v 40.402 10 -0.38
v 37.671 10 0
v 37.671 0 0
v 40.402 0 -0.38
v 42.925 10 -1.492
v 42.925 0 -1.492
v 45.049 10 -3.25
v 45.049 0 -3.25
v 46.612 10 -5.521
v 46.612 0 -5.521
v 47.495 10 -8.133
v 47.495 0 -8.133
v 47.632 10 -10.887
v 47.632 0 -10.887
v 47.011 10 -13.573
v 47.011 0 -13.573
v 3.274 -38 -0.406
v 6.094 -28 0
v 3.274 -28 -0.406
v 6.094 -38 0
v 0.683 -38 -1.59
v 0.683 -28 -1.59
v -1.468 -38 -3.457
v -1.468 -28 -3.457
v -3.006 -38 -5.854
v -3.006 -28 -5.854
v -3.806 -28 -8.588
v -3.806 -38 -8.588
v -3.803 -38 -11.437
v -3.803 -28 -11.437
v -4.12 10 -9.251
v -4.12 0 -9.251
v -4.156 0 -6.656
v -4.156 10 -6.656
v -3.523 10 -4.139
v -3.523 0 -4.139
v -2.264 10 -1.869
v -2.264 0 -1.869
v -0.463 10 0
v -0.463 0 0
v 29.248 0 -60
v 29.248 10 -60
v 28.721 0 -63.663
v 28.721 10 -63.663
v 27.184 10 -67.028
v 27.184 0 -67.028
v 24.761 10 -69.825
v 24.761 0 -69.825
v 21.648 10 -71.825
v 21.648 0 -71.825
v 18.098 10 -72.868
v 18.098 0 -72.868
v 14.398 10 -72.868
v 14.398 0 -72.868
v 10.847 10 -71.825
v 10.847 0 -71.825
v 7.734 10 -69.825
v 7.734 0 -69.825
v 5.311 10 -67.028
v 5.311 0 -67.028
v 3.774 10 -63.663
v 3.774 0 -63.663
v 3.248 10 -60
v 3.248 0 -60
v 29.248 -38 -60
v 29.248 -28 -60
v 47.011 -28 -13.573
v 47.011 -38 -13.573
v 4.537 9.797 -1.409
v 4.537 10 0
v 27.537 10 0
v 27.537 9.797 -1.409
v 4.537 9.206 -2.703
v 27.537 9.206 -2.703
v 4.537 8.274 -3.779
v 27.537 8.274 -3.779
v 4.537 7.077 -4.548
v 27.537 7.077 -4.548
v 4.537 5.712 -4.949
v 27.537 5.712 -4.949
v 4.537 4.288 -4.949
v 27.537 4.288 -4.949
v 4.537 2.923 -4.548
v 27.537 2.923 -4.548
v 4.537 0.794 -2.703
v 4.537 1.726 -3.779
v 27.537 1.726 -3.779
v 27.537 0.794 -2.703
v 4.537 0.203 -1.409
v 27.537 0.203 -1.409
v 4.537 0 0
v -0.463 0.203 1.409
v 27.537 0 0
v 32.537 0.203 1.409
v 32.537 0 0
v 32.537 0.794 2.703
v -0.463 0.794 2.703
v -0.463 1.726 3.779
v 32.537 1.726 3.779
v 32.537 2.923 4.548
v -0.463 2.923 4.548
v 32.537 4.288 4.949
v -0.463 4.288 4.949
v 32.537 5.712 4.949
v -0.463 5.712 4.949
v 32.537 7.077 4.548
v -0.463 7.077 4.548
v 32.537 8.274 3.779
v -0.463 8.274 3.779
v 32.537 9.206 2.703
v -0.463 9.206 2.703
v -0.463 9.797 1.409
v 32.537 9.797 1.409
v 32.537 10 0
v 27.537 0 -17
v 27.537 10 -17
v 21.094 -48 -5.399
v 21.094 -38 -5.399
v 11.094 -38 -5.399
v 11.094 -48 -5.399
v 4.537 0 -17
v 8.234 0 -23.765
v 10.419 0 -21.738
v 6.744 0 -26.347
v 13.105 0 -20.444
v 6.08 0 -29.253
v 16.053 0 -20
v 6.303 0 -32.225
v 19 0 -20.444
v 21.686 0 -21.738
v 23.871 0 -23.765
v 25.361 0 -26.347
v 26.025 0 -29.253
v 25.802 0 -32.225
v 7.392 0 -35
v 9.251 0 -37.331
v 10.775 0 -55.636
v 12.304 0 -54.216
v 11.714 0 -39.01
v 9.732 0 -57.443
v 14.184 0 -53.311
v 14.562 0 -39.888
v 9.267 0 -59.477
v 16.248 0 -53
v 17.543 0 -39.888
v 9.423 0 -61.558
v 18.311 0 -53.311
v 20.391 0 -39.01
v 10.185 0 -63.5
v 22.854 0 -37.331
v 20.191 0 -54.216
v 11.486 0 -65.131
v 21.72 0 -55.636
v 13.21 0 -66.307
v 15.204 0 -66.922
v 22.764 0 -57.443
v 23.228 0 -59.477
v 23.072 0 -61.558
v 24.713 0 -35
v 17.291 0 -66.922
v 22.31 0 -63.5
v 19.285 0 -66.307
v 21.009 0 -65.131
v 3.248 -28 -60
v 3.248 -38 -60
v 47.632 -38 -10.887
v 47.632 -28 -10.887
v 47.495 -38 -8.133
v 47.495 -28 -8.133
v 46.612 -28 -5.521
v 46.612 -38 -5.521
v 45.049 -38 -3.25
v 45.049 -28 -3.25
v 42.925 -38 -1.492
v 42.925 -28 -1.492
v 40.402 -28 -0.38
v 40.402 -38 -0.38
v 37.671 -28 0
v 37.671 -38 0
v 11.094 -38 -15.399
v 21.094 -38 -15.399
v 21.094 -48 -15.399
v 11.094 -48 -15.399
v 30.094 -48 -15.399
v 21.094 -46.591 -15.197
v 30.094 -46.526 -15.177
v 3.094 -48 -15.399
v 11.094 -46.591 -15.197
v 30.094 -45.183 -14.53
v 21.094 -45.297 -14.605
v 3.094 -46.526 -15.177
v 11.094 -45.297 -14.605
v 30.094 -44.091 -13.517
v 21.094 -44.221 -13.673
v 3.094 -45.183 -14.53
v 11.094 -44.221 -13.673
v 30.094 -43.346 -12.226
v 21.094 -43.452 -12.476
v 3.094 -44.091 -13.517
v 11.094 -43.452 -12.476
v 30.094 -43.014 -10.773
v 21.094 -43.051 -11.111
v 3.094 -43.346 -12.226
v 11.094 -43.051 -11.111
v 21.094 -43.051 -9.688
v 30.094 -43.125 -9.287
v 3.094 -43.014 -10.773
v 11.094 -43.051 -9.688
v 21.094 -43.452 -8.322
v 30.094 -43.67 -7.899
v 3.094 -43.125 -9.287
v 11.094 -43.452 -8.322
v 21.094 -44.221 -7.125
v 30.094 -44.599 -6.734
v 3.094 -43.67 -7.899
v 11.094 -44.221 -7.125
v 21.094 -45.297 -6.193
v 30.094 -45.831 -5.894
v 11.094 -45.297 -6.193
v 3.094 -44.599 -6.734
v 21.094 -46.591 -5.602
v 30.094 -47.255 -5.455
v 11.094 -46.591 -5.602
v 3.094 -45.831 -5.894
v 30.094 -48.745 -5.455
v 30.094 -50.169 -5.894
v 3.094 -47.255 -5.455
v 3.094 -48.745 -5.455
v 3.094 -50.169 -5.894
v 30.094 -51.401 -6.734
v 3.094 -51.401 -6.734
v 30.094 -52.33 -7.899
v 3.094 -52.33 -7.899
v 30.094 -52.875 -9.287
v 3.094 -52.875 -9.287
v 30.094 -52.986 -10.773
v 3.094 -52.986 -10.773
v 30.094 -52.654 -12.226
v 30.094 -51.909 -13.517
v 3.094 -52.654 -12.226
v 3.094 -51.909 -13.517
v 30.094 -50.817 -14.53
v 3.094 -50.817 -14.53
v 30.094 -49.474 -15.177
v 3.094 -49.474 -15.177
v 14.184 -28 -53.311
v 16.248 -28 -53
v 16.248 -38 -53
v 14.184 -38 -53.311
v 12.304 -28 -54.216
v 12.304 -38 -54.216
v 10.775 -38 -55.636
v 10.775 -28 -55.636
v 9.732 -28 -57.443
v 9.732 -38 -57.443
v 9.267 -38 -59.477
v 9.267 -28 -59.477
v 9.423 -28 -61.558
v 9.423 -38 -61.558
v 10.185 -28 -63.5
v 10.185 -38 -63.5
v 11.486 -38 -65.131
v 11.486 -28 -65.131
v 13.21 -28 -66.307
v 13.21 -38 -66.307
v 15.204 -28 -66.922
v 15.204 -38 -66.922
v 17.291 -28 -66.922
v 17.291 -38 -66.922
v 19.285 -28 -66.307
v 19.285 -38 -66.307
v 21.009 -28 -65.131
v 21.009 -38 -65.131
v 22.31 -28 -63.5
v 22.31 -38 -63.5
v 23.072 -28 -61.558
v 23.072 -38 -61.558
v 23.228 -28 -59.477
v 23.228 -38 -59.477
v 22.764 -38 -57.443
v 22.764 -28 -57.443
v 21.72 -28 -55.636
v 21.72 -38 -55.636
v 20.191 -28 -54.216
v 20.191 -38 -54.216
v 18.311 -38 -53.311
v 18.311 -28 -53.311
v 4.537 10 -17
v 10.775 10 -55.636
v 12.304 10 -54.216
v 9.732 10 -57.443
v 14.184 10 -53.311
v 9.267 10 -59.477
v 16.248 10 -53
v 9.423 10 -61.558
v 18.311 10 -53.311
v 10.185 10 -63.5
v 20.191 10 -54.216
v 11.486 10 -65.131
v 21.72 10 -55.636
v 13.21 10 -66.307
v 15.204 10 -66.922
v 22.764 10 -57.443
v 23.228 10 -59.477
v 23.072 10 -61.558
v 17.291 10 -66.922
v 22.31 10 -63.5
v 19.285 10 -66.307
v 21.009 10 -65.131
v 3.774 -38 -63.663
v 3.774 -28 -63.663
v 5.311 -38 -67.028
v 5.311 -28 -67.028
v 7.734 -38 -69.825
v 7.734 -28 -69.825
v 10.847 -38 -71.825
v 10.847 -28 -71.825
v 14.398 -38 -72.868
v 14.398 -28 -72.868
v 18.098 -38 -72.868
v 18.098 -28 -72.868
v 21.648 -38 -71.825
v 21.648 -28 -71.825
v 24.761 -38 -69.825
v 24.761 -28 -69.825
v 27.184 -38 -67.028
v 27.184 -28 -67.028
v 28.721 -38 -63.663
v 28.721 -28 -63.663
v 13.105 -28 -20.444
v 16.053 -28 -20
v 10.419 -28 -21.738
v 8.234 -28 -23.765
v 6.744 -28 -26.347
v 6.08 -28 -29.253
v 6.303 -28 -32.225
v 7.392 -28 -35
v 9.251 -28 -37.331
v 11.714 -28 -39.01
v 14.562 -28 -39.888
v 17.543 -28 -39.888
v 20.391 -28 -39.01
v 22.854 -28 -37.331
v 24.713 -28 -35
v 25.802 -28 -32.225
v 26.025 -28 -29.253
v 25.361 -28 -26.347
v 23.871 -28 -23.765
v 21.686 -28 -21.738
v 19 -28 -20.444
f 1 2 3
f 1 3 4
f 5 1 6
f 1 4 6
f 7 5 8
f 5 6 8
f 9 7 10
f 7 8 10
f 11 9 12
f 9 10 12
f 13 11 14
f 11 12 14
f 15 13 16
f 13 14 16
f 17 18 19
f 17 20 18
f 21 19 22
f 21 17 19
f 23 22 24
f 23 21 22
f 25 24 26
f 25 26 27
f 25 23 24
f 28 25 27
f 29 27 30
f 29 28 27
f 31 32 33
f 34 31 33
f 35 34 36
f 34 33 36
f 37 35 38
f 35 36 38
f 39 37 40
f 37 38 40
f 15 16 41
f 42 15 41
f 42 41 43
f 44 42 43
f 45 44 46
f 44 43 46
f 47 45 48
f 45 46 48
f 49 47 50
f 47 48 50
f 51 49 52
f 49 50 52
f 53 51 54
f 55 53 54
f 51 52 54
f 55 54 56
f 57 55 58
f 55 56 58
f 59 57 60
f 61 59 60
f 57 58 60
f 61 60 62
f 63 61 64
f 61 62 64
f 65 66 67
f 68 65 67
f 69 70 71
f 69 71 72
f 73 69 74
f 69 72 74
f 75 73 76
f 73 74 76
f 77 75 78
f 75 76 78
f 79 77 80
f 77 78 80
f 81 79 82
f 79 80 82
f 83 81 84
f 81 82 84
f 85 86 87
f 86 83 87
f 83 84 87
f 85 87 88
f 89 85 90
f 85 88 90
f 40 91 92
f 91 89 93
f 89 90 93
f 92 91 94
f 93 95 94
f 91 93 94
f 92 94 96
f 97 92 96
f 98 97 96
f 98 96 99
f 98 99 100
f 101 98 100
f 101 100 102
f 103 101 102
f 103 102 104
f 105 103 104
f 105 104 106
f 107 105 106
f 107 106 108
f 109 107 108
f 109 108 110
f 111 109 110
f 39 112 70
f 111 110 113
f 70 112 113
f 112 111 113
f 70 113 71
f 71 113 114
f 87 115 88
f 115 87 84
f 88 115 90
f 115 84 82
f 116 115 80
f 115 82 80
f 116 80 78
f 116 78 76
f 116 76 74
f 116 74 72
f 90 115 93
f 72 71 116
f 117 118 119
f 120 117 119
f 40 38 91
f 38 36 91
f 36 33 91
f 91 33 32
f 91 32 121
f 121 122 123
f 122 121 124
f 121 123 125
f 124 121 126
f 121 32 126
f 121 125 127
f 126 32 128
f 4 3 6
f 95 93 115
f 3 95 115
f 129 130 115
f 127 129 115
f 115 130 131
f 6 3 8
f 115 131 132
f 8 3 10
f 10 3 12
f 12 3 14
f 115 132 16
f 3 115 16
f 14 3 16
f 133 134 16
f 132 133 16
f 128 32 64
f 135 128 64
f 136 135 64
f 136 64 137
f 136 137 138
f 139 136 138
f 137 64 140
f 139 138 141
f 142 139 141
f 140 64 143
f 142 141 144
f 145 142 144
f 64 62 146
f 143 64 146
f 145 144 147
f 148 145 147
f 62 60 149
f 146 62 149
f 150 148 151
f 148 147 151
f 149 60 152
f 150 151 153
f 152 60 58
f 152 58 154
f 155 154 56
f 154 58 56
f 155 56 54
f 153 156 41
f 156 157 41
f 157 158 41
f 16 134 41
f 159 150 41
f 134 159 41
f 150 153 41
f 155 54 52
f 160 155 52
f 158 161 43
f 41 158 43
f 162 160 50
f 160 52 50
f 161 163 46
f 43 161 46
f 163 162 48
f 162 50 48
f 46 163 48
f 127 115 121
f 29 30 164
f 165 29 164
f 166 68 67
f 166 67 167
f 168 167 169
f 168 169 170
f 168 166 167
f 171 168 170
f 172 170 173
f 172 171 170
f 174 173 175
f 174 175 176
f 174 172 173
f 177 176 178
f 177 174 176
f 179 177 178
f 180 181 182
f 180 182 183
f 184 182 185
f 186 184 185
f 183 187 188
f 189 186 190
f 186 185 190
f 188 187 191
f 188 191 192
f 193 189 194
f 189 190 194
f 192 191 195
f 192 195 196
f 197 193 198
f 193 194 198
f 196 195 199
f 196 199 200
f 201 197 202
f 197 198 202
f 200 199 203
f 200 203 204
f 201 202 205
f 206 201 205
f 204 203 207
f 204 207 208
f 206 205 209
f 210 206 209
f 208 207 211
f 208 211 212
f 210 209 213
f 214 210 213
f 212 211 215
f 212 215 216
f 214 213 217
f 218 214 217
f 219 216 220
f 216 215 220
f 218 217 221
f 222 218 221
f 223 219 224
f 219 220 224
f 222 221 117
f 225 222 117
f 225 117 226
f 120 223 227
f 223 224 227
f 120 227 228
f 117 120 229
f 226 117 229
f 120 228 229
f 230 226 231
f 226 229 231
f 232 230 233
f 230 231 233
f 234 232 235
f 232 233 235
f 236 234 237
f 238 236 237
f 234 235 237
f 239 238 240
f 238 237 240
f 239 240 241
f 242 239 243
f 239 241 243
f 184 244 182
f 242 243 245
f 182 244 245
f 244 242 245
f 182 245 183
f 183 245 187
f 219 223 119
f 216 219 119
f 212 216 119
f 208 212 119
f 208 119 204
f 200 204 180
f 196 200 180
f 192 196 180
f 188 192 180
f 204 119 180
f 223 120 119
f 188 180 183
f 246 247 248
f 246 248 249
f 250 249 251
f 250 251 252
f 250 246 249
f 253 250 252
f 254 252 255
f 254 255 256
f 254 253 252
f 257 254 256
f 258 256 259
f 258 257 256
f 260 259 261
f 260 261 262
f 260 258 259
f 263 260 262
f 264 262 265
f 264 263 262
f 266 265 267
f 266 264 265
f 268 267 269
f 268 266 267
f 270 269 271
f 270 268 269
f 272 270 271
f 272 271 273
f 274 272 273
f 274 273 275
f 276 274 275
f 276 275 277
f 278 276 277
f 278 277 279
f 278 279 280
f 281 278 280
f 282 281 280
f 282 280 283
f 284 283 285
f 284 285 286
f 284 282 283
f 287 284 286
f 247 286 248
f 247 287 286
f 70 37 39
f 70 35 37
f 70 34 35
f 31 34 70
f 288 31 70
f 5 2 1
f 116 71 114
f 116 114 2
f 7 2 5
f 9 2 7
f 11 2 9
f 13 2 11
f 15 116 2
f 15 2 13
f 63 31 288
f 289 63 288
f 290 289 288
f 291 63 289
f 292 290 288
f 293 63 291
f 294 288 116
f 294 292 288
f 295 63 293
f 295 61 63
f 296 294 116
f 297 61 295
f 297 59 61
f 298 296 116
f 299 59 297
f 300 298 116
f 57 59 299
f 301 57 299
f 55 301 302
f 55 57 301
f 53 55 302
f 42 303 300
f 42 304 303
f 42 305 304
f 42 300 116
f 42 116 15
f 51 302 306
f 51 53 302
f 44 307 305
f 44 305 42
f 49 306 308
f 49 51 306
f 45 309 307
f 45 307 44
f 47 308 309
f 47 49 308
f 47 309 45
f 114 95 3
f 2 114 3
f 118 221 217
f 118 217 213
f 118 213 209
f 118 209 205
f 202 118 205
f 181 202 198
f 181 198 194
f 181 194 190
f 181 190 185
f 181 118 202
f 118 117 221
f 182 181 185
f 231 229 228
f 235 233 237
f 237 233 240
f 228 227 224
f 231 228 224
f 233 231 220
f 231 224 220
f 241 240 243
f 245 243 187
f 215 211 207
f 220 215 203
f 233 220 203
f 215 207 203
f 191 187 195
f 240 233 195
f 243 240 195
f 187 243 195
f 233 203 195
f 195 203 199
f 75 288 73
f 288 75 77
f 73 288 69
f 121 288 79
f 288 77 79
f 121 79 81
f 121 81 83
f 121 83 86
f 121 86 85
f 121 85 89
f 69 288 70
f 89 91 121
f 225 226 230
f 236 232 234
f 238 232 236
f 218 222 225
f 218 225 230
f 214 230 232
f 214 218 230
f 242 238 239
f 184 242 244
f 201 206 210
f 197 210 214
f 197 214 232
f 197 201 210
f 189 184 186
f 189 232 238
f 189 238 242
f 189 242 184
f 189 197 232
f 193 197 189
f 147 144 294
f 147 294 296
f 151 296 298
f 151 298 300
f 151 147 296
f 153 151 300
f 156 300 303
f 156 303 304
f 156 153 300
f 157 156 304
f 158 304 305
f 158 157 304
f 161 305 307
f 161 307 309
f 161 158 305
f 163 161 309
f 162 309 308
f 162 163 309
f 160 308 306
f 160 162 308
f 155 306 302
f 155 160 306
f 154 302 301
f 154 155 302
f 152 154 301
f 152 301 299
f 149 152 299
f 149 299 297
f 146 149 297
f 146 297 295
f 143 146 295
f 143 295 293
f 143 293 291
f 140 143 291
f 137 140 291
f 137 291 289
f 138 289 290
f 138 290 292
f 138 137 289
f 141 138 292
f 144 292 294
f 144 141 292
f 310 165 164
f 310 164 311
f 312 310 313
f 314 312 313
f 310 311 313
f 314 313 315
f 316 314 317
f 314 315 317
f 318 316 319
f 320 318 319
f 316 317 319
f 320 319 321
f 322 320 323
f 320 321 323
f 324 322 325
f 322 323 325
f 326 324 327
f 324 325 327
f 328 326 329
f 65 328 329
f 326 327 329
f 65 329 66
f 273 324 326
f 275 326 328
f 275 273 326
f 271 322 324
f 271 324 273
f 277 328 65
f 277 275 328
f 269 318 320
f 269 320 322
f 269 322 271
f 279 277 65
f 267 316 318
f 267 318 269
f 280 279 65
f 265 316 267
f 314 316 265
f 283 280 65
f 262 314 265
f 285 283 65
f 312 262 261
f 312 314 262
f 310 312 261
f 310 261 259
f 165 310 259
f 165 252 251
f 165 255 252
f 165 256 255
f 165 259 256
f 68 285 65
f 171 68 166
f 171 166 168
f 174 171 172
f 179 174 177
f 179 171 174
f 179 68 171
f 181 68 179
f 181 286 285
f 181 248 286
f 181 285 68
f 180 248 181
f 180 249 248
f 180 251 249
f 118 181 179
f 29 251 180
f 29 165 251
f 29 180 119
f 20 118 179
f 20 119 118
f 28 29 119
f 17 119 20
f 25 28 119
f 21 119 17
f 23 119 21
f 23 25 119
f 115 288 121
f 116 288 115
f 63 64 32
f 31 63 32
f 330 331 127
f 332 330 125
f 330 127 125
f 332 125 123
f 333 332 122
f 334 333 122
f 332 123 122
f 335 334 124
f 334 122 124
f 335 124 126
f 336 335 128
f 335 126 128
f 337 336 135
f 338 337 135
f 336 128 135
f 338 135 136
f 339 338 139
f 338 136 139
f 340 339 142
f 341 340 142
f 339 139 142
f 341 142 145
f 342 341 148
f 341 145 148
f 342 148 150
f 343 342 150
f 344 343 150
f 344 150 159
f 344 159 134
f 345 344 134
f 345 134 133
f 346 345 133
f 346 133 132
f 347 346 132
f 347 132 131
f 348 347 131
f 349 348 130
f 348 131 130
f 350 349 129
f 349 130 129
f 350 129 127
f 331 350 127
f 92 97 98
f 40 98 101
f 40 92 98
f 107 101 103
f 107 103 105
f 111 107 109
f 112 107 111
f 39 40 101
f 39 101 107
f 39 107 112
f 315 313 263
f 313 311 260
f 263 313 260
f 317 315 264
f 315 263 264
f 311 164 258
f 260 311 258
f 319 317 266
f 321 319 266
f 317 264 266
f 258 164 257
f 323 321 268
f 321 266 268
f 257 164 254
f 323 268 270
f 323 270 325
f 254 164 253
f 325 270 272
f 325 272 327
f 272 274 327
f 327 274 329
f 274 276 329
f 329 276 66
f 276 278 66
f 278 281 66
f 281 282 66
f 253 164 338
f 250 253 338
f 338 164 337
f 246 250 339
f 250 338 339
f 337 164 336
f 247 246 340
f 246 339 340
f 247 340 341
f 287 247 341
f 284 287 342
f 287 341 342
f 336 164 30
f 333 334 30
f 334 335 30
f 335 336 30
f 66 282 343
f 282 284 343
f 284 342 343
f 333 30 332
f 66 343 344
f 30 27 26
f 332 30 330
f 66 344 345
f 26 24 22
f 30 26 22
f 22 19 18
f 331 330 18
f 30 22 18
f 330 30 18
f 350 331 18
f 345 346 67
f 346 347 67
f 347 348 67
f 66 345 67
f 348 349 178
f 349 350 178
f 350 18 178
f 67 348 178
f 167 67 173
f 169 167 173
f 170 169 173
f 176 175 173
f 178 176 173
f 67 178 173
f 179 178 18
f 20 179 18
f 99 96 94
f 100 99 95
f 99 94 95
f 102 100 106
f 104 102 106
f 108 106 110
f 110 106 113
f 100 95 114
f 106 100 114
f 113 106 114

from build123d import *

# Parameters (mm, degrees)
SKETCH1_R                = 13
SKETCH1_R_2              = 7
BOSS_EXTRUDE2_DEPTH      = 10
SKETCH2_R                = 10
BOSS_EXTRUDE3_DEPTH      = 28
SKETCH3_R                = 10
SKETCH3_R_2              = 13
SKETCH3_R_3              = 7
BOSS_EXTRUDE4_DEPTH      = 10
SKETCH4_R                = 10
BOSS_EXTRUDE5_DEPTH      = 10
FILLET1_R                = 10
CUT_EXTRUDE1_DEPTH       = 17
BOSS_EXTRUDE6_DEPTH      = 28
BOSS_EXTRUDE6_DEPTH_BACK = 5
SKETCH6_R                = 5
FILLET2_R                = 10
SKETCH7_W                = 10
SKETCH7_H                = 10
BOSS_EXTRUDE7_DEPTH      = 10
BOSS_EXTRUDE8_DEPTH      = 9
BOSS_EXTRUDE8_DEPTH_BACK = 18
SKETCH8_R                = 5


with BuildPart() as part:
    # Sketch1 → Boss-Extrude2 (new body)
    # profile 1 of 2: a face of its own
    with BuildSketch(Plane(origin=(0, 0, 0), x_dir=(1, 0, 0), z_dir=(0, 1, 0))):
        with BuildLine():
            ThreePointArc((29.247640438, 60), (16.247640438, 47), (3.247640438, 60))
            Line((3.247640438, 60), (-5.462946679, 0))
            Line((-5.462946679, 0), (52.203983694, 0))
            Line((52.203983694, 0), (29.247640438, 60))
        make_face()
    # profile 2 of 2: a face of its own
    with BuildSketch(Plane(origin=(0, 0, 0), x_dir=(1, 0, 0), z_dir=(0, 1, 0))):
        with Locations((16.247640438, 60)):
            Circle(SKETCH1_R)
        with Locations(Location((16.247640438, 60, 0), (0, 0, 270))):
            Circle(SKETCH1_R_2, mode=Mode.SUBTRACT)
    extrude(amount=BOSS_EXTRUDE2_DEPTH)

    # Sketch2 → Boss-Extrude3 (add)
    with BuildSketch(Plane.XZ):
        with Locations(Location((16.05250876, -30, 0), (0, 0, 90))):
            Circle(SKETCH2_R)
    extrude(amount=BOSS_EXTRUDE3_DEPTH)



with BuildPart() as body_2:
    # Sketch3 → Boss-Extrude4 (new body)
    # profile 1 of 2: a face of its own
    with BuildSketch(Plane.XZ.offset(28)):
        with BuildLine():
            Line((-5.462946679, 0), (3.247640438, -60))
            ThreePointArc((3.247640438, -60), (16.247640438, -47), (29.247640438, -60))
            Line((29.247640438, -60), (52.203983694, 0))
            Line((52.203983694, 0), (-5.462946679, 0))
        make_face()
        with Locations(Location((16.05250876, -30, 0), (0, 0, 90))):
            Circle(SKETCH3_R, mode=Mode.SUBTRACT)
    # profile 2 of 2: a face of its own
    with BuildSketch(Plane.XZ.offset(28)):
        with Locations((16.247640438, -60)):
            Circle(SKETCH3_R_2)
        with Locations(Location((16.247640438, -60, 0), (0, 0, 90))):
            Circle(SKETCH3_R_3, mode=Mode.SUBTRACT)
    extrude(amount=BOSS_EXTRUDE4_DEPTH)


with BuildPart() as part_1:
    add(part.part)

    add(body_2.part)  # Boss-Extrude5 merges body 2
    # Sketch4 → Boss-Extrude5 (add)
    with BuildSketch(Plane.XZ.offset(28)):
        with Locations(Location((16.05250876, -30, 0), (0, 0, 90))):
            Circle(SKETCH4_R)
    extrude(amount=BOSS_EXTRUDE5_DEPTH)

    # Fillet1
    fillet1_edges = [part_1.edges().sort_by_distance(p)[0] for p in [
        (-5.462946679, -33, 0),
        (52.203983694, -33, 0),
    ]]
    fillet(fillet1_edges, radius=FILLET1_R)

    # Sketch5 → Cut-Extrude1 (cut)
    with BuildSketch(Plane.XY):
        Polygon((27.537053321, 10), (4.537053321, 10), (4.537053321, 5), (4.537053321, 0), (27.537053321, 0), align=None)
    extrude(amount=-CUT_EXTRUDE1_DEPTH, mode=Mode.SUBTRACT)

    # Sketch6 → Boss-Extrude6 (add, two sides: drawn at the far end of the back side and taken through both)
    with BuildSketch(Plane.ZY.offset(-27.537053321).offset(-BOSS_EXTRUDE6_DEPTH_BACK)):
        with Locations(Location((0, 5, 0), (0, 0, 90))):
            Circle(SKETCH6_R)
    extrude(amount=BOSS_EXTRUDE6_DEPTH + BOSS_EXTRUDE6_DEPTH_BACK)

    # Fillet2
    # the kernel refuses this fillet: 10 mm, written as the material it takes off along each edge
    with BuildSketch(Plane(origin=(52.203983694, -36.33251049, 0), x_dir=(-0.3573434345280911, 0, -0.9339730562493053), z_dir=(0, 1, 0))) as fillet2_piece_1:
        with BuildLine():
            CenterArc((FILLET2_R * 1.45330041958, FILLET2_R), FILLET2_R, 159.0628634, 110.9371366)
            Line((FILLET2_R * 0.519327363336, FILLET2_R * 1.35734343453), (FILLET2_R * 0.500647902211, FILLET2_R * 1.36449030322))
            Line((FILLET2_R * 0.500647902211, FILLET2_R * 1.36449030322), (-FILLET2_R * 0.0290660083917, -FILLET2_R * 0.02))
            Line((-FILLET2_R * 0.0290660083917, -FILLET2_R * 0.02), (FILLET2_R * 1.45330041958, -FILLET2_R * 0.02))
            Line((FILLET2_R * 1.45330041958, -FILLET2_R * 0.02), (FILLET2_R * 1.45330041958, 0))
        make_face()
    extrude(amount=82.665020979, mode=Mode.SUBTRACT)
    with BuildSketch(Plane(origin=(-5.462946679, -23.371123881, 0), x_dir=(1, 0, 0), z_dir=(0, 1, 0))) as fillet2_piece_2:
        with BuildLine():
            CenterArc((11.239350904, 7.814761692), FILLET2_R, 171.739711253, 59.656220213)
            Line((1.343094868, 9.251465031), (1.145169748, 9.280199097))
            Line((1.145169748, 9.280199097), (-0.197925121, 0.028734067))
            Line((-0.197925121, 0.028734067), (0, -0.2))
            ThreePointArc((0, -0.2), (2.5, -0.2), (4.875212982, -0.156295234))
            Line((4.875212982, -0.156295234), (5, 0))
        make_face()
    extrude(amount=56.742247763, mode=Mode.SUBTRACT)

    # Sketch7 → Boss-Extrude7 (add)
    with BuildSketch(Plane(origin=(0, -38, 0), x_dir=(-1, 0, 0), z_dir=(0, -1, 0))):
        with Locations((-16.093649369, 10.399188766)):
            Rectangle(SKETCH7_W, SKETCH7_H)
    extrude(amount=BOSS_EXTRUDE7_DEPTH)

    # Sketch8 → Boss-Extrude8 (add, two sides: drawn at the far end of the back side and taken through both)
    with BuildSketch(Plane(origin=(21.093649369, 0, 0), x_dir=(0, 0, -1), z_dir=(1, 0, 0)).offset(-BOSS_EXTRUDE8_DEPTH_BACK)):
        with Locations((10.399188766, -48)):
            Circle(SKETCH8_R)
    extrude(amount=BOSS_EXTRUDE8_DEPTH + BOSS_EXTRUDE8_DEPTH_BACK)


solid = part_1.part
